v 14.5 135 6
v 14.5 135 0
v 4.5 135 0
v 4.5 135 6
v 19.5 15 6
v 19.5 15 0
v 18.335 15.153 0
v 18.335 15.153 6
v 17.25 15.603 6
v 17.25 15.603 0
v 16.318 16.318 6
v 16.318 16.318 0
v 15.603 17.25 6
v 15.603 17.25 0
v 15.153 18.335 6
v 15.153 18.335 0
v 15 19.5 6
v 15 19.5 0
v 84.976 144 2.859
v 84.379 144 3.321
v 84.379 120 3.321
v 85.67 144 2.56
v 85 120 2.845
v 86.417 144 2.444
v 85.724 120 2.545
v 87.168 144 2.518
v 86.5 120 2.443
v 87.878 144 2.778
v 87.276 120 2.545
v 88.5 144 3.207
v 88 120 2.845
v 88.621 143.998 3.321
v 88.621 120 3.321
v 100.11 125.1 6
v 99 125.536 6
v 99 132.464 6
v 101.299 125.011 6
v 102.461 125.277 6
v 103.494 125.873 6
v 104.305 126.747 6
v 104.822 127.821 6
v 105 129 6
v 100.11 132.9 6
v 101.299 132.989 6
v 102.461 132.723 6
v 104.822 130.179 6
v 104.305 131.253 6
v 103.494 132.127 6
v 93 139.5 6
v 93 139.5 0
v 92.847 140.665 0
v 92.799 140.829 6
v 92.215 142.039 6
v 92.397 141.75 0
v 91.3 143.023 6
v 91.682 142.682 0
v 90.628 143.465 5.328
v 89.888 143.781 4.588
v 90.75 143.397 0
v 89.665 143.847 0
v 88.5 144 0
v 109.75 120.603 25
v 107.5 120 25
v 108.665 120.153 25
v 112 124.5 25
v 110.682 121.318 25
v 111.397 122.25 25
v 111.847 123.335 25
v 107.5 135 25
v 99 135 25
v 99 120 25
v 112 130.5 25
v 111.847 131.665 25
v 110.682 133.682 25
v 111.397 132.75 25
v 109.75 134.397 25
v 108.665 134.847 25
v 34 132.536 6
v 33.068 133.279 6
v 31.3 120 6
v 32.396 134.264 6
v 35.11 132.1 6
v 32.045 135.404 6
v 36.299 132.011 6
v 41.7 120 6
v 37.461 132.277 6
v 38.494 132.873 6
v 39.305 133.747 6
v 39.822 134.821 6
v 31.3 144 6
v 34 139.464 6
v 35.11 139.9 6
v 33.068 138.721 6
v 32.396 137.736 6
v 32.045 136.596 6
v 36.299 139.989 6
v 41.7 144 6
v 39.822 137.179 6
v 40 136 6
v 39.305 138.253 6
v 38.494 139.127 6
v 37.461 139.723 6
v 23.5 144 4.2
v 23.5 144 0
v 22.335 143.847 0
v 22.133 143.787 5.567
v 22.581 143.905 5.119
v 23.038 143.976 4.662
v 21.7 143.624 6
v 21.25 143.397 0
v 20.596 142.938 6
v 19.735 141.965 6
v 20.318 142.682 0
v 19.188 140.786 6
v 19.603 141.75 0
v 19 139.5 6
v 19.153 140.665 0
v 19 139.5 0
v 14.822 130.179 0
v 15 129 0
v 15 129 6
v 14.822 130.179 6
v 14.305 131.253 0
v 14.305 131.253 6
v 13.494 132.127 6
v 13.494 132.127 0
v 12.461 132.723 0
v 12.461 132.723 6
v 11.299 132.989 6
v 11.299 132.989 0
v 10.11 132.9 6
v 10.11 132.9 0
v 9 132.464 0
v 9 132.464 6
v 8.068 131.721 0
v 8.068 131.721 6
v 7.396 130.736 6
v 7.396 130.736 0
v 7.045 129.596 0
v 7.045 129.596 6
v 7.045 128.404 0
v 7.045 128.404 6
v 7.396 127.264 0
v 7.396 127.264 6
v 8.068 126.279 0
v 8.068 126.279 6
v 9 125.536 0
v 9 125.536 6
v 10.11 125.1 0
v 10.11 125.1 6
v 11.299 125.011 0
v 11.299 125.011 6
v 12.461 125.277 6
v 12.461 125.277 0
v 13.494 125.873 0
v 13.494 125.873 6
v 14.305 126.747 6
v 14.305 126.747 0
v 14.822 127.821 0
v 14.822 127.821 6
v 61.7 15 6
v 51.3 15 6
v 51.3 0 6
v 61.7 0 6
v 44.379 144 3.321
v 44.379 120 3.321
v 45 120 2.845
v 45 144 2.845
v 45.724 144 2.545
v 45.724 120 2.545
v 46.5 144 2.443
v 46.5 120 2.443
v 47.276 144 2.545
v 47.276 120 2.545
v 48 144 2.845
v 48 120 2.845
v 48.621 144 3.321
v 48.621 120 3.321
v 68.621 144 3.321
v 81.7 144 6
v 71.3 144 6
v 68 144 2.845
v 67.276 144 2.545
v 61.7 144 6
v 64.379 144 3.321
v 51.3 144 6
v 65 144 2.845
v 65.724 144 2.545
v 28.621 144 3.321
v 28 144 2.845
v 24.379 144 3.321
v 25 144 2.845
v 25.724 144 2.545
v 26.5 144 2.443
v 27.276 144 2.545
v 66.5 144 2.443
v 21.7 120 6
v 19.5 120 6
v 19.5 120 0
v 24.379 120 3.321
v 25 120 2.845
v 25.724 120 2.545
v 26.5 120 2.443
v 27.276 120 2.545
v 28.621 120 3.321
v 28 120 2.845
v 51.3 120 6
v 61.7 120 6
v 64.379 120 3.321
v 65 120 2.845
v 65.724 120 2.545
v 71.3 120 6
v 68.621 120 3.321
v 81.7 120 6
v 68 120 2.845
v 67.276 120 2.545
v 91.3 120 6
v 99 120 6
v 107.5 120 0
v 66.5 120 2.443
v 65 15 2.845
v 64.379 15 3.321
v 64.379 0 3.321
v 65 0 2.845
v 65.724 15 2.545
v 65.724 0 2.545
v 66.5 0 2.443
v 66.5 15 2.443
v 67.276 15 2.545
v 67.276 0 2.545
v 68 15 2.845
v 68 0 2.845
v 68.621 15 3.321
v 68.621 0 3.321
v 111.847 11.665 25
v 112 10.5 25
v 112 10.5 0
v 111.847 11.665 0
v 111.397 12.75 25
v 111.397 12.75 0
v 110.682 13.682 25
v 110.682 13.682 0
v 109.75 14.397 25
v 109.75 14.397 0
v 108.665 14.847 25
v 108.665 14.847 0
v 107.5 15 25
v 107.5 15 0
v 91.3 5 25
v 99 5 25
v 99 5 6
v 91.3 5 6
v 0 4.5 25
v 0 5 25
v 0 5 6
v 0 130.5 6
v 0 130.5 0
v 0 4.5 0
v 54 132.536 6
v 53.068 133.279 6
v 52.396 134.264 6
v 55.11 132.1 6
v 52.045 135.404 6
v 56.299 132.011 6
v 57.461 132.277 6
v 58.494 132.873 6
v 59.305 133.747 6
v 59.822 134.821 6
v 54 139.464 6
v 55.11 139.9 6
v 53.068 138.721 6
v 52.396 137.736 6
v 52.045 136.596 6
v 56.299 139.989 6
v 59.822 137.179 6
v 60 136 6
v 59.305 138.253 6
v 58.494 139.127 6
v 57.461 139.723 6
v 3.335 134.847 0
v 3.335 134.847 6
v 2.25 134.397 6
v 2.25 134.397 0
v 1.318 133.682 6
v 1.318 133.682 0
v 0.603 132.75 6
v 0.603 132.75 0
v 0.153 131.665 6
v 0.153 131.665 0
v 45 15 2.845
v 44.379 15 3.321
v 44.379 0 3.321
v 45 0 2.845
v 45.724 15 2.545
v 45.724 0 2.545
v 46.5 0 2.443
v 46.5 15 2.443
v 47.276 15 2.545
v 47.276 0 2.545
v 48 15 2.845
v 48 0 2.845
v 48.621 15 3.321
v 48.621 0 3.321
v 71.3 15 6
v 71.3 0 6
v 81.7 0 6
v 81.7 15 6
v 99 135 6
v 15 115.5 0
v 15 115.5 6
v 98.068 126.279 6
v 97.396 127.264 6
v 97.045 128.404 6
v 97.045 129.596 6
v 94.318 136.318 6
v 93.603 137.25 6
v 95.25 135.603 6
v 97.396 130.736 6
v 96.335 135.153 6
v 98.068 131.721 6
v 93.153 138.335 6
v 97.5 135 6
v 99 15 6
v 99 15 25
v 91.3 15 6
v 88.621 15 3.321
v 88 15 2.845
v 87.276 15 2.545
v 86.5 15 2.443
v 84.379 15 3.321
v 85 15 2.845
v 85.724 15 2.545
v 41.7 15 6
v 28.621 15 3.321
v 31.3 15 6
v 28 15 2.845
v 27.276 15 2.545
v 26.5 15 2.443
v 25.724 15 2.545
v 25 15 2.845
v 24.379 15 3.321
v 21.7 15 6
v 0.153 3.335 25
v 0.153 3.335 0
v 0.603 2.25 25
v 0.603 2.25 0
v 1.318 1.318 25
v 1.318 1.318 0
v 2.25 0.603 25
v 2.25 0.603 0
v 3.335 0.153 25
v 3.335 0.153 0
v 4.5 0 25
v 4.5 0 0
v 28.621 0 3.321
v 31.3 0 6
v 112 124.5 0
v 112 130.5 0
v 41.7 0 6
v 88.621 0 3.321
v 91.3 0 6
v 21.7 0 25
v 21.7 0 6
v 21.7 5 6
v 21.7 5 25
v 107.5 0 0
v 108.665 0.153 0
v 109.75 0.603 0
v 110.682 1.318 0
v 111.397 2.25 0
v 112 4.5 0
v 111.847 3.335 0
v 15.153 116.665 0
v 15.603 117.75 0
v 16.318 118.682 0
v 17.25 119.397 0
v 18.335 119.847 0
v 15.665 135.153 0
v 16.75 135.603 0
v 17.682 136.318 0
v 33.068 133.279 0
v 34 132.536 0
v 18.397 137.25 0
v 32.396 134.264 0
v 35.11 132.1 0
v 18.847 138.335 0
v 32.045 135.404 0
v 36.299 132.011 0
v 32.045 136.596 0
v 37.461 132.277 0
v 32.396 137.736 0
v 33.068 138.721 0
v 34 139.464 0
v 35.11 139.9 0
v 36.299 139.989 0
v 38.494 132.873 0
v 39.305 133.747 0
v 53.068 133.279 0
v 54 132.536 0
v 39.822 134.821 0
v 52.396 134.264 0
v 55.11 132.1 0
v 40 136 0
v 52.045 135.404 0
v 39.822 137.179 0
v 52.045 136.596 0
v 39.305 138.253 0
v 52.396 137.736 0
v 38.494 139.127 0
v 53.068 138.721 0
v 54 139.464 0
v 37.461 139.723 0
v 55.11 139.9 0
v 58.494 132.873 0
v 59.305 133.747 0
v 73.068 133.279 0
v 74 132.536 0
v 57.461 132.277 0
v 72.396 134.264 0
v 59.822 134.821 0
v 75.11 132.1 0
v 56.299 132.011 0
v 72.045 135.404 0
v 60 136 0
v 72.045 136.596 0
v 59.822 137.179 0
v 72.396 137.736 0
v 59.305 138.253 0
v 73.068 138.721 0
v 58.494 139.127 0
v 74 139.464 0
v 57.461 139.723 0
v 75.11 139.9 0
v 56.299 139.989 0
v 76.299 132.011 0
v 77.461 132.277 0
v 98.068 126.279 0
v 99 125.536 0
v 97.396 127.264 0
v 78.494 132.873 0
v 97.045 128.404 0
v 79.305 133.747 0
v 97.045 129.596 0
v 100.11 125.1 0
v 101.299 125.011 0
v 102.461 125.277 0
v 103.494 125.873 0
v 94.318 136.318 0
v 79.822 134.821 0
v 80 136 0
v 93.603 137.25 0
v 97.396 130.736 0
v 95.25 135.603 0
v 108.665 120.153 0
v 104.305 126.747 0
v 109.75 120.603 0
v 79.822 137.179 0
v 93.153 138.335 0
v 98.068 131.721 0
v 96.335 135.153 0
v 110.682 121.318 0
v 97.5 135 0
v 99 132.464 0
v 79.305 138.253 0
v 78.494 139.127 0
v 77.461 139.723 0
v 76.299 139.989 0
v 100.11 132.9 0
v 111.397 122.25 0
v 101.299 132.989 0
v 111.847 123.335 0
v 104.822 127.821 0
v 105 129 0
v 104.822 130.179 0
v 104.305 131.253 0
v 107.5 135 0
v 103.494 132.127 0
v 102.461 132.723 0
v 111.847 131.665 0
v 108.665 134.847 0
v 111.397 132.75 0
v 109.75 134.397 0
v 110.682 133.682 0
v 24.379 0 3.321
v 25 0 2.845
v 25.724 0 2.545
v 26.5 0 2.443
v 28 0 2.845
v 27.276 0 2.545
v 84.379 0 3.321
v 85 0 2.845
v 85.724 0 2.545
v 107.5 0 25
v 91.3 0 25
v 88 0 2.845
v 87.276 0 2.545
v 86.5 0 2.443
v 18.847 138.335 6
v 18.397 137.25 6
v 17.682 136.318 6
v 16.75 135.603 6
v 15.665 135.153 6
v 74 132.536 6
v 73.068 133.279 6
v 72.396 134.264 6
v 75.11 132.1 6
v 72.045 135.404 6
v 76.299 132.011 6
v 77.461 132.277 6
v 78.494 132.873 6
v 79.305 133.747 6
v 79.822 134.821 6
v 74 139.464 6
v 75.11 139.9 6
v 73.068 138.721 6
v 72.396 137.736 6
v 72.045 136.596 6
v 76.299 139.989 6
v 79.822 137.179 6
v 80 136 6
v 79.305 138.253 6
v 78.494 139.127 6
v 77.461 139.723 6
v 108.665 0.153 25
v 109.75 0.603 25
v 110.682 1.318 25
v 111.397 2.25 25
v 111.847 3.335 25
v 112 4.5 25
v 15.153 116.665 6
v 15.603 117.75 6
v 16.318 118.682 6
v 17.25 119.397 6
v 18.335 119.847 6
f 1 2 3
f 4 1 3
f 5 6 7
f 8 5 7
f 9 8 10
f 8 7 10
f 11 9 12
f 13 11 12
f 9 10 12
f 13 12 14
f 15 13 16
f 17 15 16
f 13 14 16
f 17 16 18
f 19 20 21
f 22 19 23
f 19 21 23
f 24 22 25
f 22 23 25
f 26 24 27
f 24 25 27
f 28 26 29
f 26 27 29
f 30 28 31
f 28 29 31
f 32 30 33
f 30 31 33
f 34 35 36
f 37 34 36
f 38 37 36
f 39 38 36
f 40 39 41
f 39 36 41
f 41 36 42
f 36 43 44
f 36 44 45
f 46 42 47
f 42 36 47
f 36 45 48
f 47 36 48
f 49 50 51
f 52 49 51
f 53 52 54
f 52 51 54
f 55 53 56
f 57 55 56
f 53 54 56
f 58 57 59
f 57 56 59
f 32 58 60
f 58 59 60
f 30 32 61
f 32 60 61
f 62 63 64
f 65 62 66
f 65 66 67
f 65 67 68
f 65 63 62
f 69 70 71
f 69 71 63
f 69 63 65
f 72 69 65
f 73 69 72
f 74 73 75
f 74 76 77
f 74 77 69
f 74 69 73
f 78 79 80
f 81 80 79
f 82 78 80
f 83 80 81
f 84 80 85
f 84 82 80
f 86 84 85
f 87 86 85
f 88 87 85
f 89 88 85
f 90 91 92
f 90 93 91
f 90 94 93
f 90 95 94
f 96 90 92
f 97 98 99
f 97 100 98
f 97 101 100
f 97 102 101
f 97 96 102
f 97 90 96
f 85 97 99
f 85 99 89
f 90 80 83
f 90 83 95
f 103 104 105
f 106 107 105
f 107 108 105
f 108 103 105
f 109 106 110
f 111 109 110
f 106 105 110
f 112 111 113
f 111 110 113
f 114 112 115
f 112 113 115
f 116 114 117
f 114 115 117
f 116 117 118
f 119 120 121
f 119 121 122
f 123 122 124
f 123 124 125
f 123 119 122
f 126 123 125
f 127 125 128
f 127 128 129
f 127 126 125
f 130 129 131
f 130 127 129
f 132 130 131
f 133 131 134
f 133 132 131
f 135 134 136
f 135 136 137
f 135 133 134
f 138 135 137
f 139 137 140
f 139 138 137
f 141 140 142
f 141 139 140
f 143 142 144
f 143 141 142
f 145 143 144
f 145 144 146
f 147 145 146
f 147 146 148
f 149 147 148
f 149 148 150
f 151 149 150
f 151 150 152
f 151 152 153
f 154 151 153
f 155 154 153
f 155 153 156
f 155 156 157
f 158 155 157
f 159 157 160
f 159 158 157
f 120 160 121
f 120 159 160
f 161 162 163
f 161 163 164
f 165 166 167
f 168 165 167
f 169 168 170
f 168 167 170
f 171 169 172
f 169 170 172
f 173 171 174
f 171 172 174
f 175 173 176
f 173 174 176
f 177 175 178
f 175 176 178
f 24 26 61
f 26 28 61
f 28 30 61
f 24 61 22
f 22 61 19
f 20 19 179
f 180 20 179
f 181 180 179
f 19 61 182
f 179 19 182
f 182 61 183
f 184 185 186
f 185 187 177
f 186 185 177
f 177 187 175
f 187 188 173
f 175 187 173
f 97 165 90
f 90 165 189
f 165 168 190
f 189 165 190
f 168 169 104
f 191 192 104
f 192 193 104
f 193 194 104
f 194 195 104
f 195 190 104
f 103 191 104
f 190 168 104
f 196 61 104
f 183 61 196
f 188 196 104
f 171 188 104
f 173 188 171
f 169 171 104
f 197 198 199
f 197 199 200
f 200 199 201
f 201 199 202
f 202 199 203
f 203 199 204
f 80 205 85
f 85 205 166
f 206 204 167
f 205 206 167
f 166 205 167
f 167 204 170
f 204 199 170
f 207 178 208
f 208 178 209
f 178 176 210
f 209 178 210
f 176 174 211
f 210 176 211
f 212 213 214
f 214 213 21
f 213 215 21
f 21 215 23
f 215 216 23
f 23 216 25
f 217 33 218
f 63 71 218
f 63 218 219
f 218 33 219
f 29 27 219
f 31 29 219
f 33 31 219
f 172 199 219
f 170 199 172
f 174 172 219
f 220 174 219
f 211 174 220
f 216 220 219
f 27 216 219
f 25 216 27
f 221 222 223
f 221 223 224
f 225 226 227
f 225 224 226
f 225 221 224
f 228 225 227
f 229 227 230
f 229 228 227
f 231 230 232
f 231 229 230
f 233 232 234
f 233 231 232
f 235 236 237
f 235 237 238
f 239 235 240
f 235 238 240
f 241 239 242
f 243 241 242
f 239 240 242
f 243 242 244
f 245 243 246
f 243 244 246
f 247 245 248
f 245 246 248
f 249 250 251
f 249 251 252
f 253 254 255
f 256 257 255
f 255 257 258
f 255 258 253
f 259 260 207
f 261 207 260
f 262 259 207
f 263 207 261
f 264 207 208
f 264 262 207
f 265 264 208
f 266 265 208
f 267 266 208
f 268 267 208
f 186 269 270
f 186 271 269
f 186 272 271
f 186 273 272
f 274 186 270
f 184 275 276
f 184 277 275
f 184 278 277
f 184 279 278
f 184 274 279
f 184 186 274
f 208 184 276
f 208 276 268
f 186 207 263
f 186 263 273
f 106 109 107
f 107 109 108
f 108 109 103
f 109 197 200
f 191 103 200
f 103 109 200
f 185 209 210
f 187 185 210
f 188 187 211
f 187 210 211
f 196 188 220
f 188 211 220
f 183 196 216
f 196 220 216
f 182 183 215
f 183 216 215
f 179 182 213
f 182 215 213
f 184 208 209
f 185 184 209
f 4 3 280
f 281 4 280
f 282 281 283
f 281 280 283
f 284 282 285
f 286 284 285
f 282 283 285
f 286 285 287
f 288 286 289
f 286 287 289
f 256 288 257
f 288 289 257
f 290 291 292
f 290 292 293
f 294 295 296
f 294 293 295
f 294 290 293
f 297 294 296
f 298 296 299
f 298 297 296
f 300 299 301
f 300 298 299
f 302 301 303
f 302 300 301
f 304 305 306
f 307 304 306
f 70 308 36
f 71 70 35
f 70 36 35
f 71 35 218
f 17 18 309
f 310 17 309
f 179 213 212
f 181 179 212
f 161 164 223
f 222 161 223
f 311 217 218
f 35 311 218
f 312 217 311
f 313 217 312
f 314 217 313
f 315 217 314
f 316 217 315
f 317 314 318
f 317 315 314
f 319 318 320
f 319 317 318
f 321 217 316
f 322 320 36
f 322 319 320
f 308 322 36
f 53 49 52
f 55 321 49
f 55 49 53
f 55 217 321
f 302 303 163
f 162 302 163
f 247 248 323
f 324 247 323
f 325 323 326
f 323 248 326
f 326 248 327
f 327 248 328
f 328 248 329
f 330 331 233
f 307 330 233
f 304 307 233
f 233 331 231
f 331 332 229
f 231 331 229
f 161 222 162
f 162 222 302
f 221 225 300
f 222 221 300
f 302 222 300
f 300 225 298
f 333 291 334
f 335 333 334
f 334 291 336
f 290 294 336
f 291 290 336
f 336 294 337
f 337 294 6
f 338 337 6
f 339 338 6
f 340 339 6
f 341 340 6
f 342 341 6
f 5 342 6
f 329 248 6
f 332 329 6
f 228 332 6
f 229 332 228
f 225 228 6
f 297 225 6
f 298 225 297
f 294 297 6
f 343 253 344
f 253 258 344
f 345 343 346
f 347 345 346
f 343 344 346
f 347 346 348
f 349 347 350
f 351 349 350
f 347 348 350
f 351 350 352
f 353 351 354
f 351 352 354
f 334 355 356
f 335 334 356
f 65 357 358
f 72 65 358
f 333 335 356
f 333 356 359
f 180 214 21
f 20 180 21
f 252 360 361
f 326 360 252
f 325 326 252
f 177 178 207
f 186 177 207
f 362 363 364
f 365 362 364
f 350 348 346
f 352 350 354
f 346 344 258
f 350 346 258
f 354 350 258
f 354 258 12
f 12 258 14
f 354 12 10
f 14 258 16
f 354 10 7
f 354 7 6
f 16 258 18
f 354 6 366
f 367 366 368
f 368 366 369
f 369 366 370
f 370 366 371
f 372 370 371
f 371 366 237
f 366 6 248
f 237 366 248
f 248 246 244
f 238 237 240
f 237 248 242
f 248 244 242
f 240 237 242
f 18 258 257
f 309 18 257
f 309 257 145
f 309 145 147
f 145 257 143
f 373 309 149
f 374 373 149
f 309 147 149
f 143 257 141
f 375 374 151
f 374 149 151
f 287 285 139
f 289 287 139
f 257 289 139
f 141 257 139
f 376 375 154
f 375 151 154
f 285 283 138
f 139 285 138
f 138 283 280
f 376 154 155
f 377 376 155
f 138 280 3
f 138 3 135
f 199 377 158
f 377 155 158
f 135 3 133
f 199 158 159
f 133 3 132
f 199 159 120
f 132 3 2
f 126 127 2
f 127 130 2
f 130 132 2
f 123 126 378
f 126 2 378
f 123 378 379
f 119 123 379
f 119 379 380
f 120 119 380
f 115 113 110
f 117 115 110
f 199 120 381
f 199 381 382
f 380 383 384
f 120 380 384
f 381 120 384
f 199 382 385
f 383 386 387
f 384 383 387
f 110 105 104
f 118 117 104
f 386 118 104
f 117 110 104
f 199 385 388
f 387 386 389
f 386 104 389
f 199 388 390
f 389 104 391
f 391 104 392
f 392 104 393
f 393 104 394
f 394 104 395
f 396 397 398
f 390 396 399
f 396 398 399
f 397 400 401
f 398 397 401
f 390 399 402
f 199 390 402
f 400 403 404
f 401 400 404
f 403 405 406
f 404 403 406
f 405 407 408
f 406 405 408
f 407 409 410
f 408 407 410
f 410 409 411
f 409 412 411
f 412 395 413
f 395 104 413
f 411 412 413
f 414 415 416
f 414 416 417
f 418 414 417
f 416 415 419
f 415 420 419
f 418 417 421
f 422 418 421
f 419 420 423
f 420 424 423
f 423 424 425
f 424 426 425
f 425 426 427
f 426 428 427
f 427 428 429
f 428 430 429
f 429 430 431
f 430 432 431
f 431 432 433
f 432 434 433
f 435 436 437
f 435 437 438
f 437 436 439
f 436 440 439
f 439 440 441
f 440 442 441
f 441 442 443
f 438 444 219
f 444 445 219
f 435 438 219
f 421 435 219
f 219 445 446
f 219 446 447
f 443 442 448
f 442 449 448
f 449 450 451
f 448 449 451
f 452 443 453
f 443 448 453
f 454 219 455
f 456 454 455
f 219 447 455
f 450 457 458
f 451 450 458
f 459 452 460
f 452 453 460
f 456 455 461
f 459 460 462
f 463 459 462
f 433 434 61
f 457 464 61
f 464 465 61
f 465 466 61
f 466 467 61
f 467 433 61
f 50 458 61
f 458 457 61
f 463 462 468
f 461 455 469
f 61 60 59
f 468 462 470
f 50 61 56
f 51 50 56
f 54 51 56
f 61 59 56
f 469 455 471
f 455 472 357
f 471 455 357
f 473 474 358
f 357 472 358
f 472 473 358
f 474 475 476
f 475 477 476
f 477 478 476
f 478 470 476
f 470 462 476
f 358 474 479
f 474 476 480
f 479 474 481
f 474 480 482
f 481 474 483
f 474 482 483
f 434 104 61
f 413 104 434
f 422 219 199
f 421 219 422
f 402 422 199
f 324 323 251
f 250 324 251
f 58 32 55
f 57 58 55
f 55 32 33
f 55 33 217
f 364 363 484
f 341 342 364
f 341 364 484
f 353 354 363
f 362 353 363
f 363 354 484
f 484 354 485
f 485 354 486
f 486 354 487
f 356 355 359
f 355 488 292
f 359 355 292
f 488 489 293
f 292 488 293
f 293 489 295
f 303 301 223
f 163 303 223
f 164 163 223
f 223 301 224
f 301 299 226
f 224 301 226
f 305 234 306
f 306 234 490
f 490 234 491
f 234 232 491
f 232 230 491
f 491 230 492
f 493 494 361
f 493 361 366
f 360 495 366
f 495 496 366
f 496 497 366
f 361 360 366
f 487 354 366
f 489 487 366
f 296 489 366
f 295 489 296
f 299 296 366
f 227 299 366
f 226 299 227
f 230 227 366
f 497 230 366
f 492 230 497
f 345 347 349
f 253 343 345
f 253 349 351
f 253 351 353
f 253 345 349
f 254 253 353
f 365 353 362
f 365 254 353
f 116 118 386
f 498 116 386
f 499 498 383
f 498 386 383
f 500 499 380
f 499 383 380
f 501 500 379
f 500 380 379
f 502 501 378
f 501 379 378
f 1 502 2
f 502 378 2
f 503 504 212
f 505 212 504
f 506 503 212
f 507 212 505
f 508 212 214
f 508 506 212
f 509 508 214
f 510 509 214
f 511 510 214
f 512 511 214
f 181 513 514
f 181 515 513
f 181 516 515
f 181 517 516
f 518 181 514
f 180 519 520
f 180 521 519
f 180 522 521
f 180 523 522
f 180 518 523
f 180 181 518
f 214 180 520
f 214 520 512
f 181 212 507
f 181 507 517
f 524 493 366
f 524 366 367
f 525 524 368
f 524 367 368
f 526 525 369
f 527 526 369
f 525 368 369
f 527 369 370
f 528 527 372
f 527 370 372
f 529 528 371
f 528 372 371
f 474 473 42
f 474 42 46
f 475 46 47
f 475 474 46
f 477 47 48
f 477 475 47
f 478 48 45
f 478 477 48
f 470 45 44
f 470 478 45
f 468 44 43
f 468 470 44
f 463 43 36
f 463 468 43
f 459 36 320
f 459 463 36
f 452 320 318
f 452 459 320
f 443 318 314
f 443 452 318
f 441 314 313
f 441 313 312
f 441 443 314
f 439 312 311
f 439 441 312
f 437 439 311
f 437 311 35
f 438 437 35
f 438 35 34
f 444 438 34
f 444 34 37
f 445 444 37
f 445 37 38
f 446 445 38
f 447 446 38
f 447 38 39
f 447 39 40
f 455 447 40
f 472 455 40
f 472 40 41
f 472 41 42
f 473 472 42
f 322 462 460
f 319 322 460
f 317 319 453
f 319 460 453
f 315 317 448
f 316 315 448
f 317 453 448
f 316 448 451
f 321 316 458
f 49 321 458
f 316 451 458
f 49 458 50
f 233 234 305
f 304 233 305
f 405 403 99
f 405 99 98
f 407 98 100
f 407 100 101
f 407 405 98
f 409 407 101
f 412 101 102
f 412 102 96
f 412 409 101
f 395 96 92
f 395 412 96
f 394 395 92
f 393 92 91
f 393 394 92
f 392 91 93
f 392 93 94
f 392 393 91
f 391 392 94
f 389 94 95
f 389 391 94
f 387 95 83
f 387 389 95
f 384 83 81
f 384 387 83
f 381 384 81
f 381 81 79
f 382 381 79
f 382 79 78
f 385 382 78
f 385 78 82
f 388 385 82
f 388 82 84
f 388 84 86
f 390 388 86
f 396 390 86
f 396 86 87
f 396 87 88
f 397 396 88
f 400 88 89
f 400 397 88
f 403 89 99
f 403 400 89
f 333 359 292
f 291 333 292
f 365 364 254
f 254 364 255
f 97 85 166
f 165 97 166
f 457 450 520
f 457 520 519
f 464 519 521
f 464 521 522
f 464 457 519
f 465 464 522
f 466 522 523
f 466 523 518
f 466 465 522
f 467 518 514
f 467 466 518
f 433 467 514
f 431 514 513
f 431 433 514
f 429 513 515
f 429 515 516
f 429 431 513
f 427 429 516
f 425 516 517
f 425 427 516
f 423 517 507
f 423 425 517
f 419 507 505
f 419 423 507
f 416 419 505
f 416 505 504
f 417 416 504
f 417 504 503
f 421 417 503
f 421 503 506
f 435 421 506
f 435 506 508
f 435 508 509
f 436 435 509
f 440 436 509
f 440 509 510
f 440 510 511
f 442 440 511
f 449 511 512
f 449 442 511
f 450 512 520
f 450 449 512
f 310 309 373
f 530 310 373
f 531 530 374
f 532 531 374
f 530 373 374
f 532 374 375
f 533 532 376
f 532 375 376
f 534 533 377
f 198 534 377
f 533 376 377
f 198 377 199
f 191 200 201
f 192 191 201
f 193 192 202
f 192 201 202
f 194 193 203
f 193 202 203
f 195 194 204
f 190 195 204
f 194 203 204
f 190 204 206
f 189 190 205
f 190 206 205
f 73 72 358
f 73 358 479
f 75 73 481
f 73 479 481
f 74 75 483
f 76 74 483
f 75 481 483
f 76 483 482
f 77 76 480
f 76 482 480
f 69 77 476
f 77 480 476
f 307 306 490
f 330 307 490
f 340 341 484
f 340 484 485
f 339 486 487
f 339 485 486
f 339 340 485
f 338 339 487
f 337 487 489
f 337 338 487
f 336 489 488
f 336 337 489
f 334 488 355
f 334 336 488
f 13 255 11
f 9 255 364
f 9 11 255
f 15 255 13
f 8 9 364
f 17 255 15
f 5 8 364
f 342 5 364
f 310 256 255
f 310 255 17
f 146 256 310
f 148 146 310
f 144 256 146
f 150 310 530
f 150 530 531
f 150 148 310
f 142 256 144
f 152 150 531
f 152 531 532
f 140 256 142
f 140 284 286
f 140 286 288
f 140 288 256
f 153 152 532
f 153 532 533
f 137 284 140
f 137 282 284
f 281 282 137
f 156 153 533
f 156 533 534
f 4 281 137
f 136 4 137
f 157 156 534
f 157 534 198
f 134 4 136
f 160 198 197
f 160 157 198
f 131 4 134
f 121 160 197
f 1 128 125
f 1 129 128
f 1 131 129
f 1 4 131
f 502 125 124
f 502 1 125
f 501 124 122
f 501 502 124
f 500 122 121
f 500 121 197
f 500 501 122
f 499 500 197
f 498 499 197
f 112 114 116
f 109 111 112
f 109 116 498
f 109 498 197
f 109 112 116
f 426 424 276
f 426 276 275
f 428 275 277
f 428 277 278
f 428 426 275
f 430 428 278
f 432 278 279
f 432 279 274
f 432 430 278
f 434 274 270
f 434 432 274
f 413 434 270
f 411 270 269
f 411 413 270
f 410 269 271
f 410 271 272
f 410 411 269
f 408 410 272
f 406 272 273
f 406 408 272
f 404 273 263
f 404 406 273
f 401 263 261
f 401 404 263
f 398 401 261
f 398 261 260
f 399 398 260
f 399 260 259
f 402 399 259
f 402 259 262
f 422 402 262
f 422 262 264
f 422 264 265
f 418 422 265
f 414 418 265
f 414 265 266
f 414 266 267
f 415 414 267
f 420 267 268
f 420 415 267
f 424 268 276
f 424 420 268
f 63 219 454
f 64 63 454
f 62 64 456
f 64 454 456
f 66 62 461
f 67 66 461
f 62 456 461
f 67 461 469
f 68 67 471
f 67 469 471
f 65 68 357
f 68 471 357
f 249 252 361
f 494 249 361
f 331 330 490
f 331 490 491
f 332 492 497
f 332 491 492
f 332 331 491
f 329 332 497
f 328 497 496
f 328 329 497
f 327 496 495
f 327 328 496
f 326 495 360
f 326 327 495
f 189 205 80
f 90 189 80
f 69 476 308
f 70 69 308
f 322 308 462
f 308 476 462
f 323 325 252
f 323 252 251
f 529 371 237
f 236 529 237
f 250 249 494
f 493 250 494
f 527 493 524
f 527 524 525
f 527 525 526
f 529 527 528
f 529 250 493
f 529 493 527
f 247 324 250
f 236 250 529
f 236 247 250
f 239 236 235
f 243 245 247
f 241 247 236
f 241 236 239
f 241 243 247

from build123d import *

# Parameters (mm, degrees)
F0_R     = 4
F1_DEPTH = 6
F3_DEPTH = 25
F4_DEPTH = 120.001
F6_DEPTH = 19


with BuildPart() as f1:
    # F0 (on Top) → F1 (new body)
    with BuildSketch(Plane.XY):
        with BuildLine():
            ThreePointArc((93, 139.5), (91.681981, 142.681981), (88.5, 144))
            Line((88.5, 144), (23.5, 144))
            ThreePointArc((23.5, 144), (20.318019, 142.681981), (19, 139.5))
            ThreePointArc((19, 139.5), (17.681981, 136.318019), (14.5, 135))
            Line((14.5, 135), (4.5, 135))
            ThreePointArc((4.5, 135), (1.318019, 133.681981), (0, 130.5))
            Line((0, 130.5), (0, 4.5))
            ThreePointArc((0, 4.5), (1.318019, 1.318019), (4.5, 0))
            Line((4.5, 0), (107.5, 0))
            ThreePointArc((107.5, 0), (110.681981, 1.318019), (112, 4.5))
            Line((112, 4.5), (112, 10.5))
            ThreePointArc((112, 10.5), (110.681981, 13.681981), (107.5, 15))
            Line((107.5, 15), (19.5, 15))
            ThreePointArc((19.5, 15), (16.318019, 16.318019), (15, 19.5))
            Line((15, 19.5), (15, 115.5))
            ThreePointArc((15, 115.5), (16.318019, 118.681981), (19.5, 120))
            Line((19.5, 120), (107.5, 120))
            ThreePointArc((107.5, 120), (110.681981, 121.318019), (112, 124.5))
            Line((112, 124.5), (112, 130.5))
            ThreePointArc((112, 130.5), (110.681981, 133.681981), (107.5, 135))
            Line((107.5, 135), (97.5, 135))
            ThreePointArc((97.5, 135), (94.318019, 136.318019), (93, 139.5))
        make_face()
        with Locations((11, 129)):
            Circle(F0_R, mode=Mode.SUBTRACT)
        with Locations((36, 136)):
            Circle(F0_R, mode=Mode.SUBTRACT)
        with Locations((56, 136)):
            Circle(F0_R, mode=Mode.SUBTRACT)
        with Locations((76, 136)):
            Circle(F0_R, mode=Mode.SUBTRACT)
        with Locations((101, 129)):
            Circle(F0_R, mode=Mode.SUBTRACT)
    extrude(amount=F1_DEPTH)

    # F2 (on face) → F3 (cut)
    with BuildSketch(Plane.XZ.offset(-120)):
        with BuildLine():
            Line((21.7, 7), (21.7, 6))
            Line((21.7, 6), (24.37868, 3.32132))
            ThreePointArc((24.37868, 3.32132), (26.5, 2.442641), (28.62132, 3.32132))
            Line((28.62132, 3.32132), (31.3, 6))
            Line((31.3, 6), (41.7, 6))
            Line((41.7, 6), (44.37868, 3.32132))
            ThreePointArc((44.37868, 3.32132), (46.5, 2.442641), (48.62132, 3.32132))
            Line((48.62132, 3.32132), (51.3, 6))
            Line((51.3, 6), (61.7, 6))
            Line((61.7, 6), (64.37868, 3.32132))
            ThreePointArc((64.37868, 3.32132), (66.5, 2.442641), (68.62132, 3.32132))
            Line((68.62132, 3.32132), (71.3, 6))
            Line((71.3, 6), (81.7, 6))
            Line((81.7, 6), (84.37868, 3.32132))
            ThreePointArc((84.37868, 3.32132), (86.5, 2.442641), (88.62132, 3.32132))
            Line((88.62132, 3.32132), (91.3, 6))
            Line((91.3, 6), (91.3, 7))
            Line((91.3, 7), (21.7, 7))
        make_face()
    extrude(amount=-F3_DEPTH, mode=Mode.SUBTRACT)

    # F2 (on face) → F4 (cut, through all)
    with BuildSketch(Plane.XZ.offset(-120)):
        with BuildLine():
            Line((21.7, 7), (21.7, 6))
            Line((21.7, 6), (24.37868, 3.32132))
            ThreePointArc((24.37868, 3.32132), (26.5, 2.442641), (28.62132, 3.32132))
            Line((28.62132, 3.32132), (31.3, 6))
            Line((31.3, 6), (41.7, 6))
            Line((41.7, 6), (44.37868, 3.32132))
            ThreePointArc((44.37868, 3.32132), (46.5, 2.442641), (48.62132, 3.32132))
            Line((48.62132, 3.32132), (51.3, 6))
            Line((51.3, 6), (61.7, 6))
            Line((61.7, 6), (64.37868, 3.32132))
            ThreePointArc((64.37868, 3.32132), (66.5, 2.442641), (68.62132, 3.32132))
            Line((68.62132, 3.32132), (71.3, 6))
            Line((71.3, 6), (81.7, 6))
            Line((81.7, 6), (84.37868, 3.32132))
            ThreePointArc((84.37868, 3.32132), (86.5, 2.442641), (88.62132, 3.32132))
            Line((88.62132, 3.32132), (91.3, 6))
            Line((91.3, 6), (91.3, 7))
            Line((91.3, 7), (21.7, 7))
        make_face()
    extrude(amount=F4_DEPTH, mode=Mode.SUBTRACT)

    # F5 (on face) → F6 (join)
    with BuildSketch(Plane.XY.offset(6)):
        with BuildLine():
            Line((21.7, 5), (0, 5))
            Line((0, 5), (0, 4.5))
            ThreePointArc((0, 4.5), (1.318019, 1.318019), (4.5, 0))
            Line((4.5, 0), (21.7, 0))
            Line((21.7, 0), (21.7, 5))
        make_face()
        with BuildLine():
            Line((91.3, 5), (91.3, 0))
            Line((91.3, 0), (107.5, 0))
            ThreePointArc((107.5, 0), (110.681981, 1.318019), (112, 4.5))
            Line((112, 4.5), (112, 10.5))
            ThreePointArc((112, 10.5), (110.681981, 13.681981), (107.5, 15))
            Line((107.5, 15), (99, 15))
            Line((99, 15), (99, 5))
            Line((99, 5), (91.3, 5))
        make_face()
        with BuildLine():
            Line((107.5, 135), (99, 135))
            Line((99, 135), (99, 120))
            Line((99, 120), (107.5, 120))
            ThreePointArc((107.5, 120), (110.681981, 121.318019), (112, 124.5))
            Line((112, 124.5), (112, 130.5))
            ThreePointArc((112, 130.5), (110.681981, 133.681981), (107.5, 135))
        make_face()
    extrude(amount=F6_DEPTH)


solid = f1.part
